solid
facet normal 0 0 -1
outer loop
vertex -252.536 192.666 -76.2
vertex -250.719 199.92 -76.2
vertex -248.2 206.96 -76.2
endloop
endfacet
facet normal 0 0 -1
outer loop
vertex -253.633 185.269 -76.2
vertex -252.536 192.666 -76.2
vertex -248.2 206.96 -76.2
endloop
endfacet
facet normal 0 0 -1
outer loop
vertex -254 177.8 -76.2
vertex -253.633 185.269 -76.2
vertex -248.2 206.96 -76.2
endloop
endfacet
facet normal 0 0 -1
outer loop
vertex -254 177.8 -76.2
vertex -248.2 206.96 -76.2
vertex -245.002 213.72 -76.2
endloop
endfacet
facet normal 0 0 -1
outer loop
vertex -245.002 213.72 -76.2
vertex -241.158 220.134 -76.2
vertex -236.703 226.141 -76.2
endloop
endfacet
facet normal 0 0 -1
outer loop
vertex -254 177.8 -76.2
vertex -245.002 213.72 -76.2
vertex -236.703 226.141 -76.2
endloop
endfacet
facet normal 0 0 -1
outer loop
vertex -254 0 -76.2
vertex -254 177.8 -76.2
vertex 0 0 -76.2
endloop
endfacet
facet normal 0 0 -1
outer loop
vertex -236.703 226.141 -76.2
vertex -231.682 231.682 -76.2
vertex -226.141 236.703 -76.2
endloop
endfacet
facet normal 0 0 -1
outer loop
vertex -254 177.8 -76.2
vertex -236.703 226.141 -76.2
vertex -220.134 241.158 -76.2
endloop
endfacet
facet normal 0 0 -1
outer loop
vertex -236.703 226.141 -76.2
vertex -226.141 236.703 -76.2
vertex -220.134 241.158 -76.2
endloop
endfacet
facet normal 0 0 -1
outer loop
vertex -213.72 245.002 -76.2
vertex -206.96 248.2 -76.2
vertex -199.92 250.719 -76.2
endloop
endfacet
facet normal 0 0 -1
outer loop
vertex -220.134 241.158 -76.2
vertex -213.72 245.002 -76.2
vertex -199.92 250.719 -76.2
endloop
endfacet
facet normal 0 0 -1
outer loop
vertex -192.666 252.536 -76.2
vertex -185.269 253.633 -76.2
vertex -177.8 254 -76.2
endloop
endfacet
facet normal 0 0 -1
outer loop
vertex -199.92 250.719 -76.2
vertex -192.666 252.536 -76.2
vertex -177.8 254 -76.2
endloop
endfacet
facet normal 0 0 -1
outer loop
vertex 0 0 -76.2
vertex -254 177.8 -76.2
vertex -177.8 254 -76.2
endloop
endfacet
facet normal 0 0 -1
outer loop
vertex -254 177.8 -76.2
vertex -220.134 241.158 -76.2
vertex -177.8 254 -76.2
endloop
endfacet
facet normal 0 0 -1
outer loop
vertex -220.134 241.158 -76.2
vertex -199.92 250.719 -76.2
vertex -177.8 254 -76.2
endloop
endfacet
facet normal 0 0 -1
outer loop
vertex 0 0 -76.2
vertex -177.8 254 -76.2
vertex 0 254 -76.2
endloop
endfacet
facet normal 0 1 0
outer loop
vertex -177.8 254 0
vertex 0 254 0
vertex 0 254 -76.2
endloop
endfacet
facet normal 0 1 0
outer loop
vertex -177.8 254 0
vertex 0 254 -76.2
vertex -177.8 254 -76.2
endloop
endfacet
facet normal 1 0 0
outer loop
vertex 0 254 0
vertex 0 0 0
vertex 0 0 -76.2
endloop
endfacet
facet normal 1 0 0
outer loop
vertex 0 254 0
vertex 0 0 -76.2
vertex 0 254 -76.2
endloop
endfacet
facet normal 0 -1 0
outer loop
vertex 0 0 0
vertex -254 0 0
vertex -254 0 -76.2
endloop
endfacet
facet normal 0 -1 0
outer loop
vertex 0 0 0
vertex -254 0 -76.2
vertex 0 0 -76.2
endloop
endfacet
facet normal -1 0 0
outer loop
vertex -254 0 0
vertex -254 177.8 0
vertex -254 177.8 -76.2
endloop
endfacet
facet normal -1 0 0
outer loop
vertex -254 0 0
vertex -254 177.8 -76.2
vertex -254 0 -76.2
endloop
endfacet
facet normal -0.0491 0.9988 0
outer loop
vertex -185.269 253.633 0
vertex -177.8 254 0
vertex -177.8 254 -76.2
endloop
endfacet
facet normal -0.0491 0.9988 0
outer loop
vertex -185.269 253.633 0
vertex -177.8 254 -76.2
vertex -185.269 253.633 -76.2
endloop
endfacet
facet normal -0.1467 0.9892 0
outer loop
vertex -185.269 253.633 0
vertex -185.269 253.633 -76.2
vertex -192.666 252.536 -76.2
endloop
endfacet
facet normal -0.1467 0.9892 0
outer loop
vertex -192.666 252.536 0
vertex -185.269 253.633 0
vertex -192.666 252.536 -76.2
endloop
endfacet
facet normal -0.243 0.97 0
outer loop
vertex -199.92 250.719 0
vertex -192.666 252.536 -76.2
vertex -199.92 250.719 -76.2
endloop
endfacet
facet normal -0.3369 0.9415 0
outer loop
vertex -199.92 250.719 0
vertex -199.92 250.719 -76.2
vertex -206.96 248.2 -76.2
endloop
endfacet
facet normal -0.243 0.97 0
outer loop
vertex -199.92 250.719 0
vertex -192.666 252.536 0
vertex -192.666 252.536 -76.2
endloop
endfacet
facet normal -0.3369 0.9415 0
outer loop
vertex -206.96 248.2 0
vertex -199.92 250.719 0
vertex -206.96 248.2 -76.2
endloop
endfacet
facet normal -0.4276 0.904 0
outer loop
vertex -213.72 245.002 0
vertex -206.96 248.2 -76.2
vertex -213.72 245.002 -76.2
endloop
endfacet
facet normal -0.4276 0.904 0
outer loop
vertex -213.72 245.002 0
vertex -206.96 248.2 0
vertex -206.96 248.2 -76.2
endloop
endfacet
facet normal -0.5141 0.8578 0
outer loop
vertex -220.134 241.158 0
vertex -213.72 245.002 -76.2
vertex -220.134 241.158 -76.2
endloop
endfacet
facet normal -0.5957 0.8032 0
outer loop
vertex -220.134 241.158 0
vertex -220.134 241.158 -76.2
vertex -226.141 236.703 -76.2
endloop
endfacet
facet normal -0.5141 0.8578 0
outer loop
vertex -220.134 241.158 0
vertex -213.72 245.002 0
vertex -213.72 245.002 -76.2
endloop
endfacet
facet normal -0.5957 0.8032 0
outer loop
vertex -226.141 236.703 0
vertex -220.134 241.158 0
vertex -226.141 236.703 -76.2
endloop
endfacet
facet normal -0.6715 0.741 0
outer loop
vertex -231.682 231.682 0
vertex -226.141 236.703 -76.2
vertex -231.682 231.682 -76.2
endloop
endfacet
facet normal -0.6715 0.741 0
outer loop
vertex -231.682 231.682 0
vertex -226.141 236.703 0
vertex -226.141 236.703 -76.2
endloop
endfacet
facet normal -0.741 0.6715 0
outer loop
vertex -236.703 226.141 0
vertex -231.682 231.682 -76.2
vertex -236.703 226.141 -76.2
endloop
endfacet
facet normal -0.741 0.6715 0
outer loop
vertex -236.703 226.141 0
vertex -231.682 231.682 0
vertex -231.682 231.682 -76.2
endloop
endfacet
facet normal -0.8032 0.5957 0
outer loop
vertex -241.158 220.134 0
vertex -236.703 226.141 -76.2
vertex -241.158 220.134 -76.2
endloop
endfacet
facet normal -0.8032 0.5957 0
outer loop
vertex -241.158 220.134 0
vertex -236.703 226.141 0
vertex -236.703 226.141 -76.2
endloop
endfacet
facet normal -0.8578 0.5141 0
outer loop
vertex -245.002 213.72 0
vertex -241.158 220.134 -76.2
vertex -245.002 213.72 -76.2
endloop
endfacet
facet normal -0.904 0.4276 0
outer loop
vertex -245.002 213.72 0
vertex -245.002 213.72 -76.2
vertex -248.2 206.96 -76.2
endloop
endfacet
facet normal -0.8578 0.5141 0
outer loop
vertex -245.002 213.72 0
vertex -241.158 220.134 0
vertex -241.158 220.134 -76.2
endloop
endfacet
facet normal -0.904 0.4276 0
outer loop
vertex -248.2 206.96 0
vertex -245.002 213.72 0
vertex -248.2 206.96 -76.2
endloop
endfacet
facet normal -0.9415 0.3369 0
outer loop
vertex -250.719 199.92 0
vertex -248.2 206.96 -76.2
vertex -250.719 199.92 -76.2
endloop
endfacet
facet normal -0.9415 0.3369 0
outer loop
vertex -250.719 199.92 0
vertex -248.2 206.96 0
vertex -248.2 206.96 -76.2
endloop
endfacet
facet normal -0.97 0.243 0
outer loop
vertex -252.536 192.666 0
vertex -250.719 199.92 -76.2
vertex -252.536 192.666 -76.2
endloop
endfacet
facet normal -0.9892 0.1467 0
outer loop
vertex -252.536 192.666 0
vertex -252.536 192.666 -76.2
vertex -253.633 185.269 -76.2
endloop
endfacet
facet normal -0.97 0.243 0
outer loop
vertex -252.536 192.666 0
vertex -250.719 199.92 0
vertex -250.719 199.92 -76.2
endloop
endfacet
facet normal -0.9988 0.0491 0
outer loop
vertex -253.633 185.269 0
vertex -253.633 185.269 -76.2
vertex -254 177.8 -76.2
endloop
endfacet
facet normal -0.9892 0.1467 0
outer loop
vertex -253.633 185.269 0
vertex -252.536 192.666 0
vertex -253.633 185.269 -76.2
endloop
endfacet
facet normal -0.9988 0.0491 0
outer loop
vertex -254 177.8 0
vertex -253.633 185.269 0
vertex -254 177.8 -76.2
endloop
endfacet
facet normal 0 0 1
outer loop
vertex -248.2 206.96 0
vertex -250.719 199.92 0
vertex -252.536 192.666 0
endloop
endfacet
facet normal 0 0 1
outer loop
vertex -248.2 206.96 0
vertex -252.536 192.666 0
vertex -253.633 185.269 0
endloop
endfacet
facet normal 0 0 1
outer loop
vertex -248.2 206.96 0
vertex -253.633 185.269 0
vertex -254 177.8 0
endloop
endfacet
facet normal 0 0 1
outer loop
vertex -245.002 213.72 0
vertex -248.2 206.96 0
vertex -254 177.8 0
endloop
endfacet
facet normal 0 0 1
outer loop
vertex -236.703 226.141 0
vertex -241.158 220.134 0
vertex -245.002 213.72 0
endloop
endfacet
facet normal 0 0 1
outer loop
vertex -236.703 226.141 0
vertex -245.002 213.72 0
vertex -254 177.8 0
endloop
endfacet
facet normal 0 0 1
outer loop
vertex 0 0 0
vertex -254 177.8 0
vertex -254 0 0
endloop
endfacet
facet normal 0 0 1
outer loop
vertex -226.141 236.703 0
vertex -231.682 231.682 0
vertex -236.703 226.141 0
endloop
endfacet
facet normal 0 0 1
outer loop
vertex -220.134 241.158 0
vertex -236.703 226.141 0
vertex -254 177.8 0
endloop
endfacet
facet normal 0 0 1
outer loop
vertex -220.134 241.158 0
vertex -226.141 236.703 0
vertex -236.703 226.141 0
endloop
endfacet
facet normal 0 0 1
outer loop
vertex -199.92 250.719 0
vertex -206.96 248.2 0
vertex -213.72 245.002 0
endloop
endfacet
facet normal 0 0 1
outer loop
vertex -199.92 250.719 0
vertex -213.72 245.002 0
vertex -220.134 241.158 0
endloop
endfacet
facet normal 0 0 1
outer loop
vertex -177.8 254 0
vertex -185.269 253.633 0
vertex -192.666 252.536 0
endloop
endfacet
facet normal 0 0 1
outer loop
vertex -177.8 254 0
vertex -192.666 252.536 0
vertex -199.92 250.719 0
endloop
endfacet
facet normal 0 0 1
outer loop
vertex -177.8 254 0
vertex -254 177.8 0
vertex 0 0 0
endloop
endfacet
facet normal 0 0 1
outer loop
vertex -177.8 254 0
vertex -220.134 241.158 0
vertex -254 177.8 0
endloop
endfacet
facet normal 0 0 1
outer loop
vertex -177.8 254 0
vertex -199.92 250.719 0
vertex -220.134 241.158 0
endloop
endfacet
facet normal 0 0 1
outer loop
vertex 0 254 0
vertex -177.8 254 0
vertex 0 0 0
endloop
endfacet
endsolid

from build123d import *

# Parameters (mm, degrees)
BOSS_EXTRUDE1_DEPTH = 76.2


with BuildPart() as part:
    # Sketch1 → Boss-Extrude1 (new body)
    with BuildSketch(Plane.XY):
        with BuildLine():
            Line((0, 0), (0, 254))
            Line((0, 254), (-177.8, 254))
            ThreePointArc((-177.8, 254), (-231.681536726, 231.681536726), (-254, 177.8))
            Line((-254, 177.8), (-254, 0))
            Line((-254, 0), (0, 0))
        make_face()
    extrude(amount=-BOSS_EXTRUDE1_DEPTH)


solid = part.part
